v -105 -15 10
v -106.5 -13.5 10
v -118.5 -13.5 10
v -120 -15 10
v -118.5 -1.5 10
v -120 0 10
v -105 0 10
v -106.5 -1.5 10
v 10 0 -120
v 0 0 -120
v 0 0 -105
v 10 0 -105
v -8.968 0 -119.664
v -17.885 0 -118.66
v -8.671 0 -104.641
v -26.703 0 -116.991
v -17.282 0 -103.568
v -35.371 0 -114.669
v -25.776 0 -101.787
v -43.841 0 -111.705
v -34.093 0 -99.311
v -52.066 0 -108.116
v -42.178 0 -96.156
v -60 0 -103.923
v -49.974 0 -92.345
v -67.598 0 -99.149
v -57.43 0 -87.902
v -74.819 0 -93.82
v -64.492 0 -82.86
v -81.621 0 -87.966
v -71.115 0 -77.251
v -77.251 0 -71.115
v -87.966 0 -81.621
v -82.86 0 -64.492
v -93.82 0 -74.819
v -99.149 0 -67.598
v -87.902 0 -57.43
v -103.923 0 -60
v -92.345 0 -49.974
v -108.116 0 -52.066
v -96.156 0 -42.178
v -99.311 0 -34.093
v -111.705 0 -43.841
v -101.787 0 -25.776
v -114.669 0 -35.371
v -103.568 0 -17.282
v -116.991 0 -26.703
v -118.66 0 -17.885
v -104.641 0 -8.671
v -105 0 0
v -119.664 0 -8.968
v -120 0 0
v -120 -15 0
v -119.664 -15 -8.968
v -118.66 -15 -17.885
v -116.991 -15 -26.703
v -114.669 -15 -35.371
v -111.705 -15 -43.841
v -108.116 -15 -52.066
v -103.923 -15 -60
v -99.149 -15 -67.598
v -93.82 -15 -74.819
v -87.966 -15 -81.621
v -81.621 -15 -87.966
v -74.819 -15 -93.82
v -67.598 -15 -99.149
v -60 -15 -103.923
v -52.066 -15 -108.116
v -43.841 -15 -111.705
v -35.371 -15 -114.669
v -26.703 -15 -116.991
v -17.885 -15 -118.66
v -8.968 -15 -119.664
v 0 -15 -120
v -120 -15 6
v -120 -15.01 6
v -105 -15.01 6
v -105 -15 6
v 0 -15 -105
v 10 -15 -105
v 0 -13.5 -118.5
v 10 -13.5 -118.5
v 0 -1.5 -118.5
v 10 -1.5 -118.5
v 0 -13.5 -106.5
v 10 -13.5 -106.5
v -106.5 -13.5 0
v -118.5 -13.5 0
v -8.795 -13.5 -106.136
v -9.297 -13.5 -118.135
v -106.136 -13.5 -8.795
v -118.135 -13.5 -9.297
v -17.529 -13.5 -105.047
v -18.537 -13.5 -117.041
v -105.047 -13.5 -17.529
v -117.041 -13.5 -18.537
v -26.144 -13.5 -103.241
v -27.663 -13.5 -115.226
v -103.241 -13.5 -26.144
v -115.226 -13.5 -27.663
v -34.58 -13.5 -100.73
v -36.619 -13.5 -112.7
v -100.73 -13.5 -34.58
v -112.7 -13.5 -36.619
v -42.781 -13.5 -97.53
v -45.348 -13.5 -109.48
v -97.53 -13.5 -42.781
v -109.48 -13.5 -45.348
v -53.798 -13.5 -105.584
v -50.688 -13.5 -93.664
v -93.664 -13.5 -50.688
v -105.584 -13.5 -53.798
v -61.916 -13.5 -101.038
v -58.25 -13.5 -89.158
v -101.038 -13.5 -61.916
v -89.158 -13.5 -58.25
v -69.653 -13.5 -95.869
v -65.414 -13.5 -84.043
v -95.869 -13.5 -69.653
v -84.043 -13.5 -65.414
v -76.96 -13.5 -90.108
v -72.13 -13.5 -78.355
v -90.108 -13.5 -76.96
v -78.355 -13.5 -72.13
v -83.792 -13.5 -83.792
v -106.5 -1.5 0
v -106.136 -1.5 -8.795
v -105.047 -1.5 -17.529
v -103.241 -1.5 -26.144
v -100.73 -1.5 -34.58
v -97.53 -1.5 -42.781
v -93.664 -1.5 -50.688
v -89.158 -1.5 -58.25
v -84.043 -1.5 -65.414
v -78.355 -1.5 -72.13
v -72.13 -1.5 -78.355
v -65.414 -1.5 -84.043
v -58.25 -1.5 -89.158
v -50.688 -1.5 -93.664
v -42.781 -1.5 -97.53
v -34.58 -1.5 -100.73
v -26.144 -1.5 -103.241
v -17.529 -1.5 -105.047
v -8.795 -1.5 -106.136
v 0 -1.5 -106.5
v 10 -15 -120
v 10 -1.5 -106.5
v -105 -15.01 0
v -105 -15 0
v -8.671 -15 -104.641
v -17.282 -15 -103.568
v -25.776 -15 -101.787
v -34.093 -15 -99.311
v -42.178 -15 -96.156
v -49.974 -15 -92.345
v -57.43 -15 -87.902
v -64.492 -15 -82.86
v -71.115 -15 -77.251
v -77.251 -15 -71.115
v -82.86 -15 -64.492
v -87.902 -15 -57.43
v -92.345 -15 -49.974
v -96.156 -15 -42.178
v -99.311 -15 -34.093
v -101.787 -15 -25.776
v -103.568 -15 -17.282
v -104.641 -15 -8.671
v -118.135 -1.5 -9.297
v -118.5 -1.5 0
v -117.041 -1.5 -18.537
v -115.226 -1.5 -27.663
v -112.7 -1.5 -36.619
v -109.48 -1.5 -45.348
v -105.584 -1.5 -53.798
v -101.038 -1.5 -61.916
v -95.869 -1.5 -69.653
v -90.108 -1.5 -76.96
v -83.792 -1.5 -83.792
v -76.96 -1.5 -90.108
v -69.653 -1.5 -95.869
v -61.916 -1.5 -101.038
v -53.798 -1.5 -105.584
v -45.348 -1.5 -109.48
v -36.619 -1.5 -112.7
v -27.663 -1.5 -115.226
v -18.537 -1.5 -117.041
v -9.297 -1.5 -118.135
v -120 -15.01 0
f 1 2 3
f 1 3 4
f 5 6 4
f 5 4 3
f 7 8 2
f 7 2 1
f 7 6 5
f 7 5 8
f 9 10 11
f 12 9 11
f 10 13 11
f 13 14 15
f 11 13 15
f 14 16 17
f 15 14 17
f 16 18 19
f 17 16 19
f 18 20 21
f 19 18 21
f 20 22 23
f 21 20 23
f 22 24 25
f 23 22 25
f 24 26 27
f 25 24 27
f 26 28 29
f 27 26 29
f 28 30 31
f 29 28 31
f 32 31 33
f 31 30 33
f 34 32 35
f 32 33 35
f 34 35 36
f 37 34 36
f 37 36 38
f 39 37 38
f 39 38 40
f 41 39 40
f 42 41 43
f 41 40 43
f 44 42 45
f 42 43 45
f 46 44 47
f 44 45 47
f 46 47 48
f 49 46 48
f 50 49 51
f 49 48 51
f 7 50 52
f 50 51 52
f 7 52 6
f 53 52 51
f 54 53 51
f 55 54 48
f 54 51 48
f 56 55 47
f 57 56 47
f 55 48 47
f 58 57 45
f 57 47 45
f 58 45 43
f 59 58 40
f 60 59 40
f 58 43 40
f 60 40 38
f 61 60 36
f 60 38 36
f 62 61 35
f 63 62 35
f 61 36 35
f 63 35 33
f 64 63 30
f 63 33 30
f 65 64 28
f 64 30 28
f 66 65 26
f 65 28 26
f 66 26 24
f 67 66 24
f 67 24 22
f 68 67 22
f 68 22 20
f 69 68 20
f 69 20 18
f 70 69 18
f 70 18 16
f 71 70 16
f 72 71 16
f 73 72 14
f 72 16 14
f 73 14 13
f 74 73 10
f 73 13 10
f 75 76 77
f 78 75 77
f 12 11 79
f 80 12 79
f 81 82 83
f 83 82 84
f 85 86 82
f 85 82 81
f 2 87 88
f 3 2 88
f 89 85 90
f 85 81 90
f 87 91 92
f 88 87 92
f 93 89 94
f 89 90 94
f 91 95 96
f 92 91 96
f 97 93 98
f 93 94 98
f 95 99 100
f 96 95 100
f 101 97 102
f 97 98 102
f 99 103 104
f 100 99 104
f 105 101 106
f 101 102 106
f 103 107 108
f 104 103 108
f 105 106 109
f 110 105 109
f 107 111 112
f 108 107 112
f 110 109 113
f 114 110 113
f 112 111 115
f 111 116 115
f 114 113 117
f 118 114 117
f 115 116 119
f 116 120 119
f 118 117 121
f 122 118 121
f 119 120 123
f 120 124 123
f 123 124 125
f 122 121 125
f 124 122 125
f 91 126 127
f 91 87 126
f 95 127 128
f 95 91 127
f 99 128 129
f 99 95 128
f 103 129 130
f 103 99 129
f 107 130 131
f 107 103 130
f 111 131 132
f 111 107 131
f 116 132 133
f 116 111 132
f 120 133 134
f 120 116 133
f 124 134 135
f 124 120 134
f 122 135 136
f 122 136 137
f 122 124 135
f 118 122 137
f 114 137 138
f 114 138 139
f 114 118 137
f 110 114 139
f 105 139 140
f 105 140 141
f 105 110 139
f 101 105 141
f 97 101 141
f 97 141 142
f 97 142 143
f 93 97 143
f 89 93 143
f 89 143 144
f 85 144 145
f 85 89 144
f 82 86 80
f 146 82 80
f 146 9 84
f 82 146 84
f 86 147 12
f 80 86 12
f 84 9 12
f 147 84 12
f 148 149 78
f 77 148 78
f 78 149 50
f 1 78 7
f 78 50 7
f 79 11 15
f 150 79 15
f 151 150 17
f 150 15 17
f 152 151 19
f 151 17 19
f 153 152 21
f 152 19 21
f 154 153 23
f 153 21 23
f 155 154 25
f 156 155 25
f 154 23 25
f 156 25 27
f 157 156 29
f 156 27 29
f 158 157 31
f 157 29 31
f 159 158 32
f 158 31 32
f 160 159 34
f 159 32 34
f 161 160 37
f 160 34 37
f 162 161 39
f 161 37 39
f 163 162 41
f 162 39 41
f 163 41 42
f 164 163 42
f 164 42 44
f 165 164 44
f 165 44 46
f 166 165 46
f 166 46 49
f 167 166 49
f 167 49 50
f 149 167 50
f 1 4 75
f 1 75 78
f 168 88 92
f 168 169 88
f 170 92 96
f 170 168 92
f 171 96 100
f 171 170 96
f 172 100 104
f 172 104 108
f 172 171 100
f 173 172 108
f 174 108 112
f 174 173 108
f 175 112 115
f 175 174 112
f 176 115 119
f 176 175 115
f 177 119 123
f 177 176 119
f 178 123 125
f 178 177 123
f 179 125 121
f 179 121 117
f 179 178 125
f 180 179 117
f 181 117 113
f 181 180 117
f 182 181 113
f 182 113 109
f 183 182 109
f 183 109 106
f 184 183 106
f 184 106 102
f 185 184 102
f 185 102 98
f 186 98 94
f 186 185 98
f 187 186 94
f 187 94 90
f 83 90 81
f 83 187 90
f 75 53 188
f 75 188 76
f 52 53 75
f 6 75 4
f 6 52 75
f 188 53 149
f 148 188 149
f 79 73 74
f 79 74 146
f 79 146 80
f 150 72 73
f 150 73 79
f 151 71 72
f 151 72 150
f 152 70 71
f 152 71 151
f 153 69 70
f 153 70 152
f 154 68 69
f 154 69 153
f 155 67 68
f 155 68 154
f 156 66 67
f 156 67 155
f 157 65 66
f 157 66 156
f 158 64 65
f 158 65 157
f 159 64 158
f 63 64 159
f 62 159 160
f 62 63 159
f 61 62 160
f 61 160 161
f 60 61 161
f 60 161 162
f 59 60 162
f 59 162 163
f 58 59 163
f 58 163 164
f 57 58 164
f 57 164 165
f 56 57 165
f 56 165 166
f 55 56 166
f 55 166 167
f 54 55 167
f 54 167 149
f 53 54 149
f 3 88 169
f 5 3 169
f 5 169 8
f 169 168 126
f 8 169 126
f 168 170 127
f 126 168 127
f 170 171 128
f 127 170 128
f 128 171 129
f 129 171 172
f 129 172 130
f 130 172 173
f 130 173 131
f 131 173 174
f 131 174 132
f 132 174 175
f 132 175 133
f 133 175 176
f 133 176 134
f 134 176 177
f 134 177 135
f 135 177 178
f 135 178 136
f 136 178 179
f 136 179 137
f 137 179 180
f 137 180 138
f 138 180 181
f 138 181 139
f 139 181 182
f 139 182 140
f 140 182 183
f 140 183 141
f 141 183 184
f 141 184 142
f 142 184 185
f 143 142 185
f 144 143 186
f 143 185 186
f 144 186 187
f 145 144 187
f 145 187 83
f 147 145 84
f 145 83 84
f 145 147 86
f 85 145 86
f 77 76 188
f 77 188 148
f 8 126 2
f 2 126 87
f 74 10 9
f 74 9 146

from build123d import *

# Parameters (mm, degrees)
F1_DEPTH = 15
F2_DEPTH = 10
F3_DEPTH = 10
F4_W     = 15
F4_H     = 10
F5_DEPTH = 0.01
F6_W     = 15
F6_H     = 4
F7_DEPTH = 0.01
F8_W     = 12
F8_H     = 12


with BuildPart() as f1:
    # F0 (on Front) → F1 (new body)
    with BuildSketch(Plane.XZ):
        with BuildLine():
            Line((-105, 0), (-120, 0))
            ThreePointArc((-120, 0), (-84.8528137424, -84.8528137424), (0, -120))
            Line((0, -120), (0, -105))
            ThreePointArc((0, -105), (-74.2462120246, -74.2462120246), (-105, 0))
        make_face()
    extrude(amount=F1_DEPTH)

    # F2 (add): a face of the model
    f2_faces = [f1.faces().sort_by_distance(p)[0] for p in [
        (-112.5, -7.5, 0),
    ]]
    extrude(f2_faces, amount=F2_DEPTH)

    # F3 (add): a face of the model
    f3_faces = [f1.faces().sort_by_distance(p)[0] for p in [
        (0, -7.5, -112.5),
    ]]
    extrude(f3_faces, amount=F3_DEPTH)

    # F4 (on face) → F5 (join)
    with BuildSketch(Plane.XZ.offset(15)):
        with Locations((-112.5, 5)):
            Rectangle(F4_W, F4_H)
    extrude(amount=F5_DEPTH)

    # F6 (on face) → F7 (cut)
    with BuildSketch(Plane.XZ.offset(15.01)):
        with Locations((-112.5, 8)):
            Rectangle(F6_W, F6_H)
    extrude(amount=-F7_DEPTH, mode=Mode.SUBTRACT)

    # F9: sweep along a path in F9_path
    with BuildLine(Plane(origin=(-105, 0, 0), x_dir=(0, 0, -1), z_dir=(0, 1, 0))) as f9_path:
        Line((-10, 0), (0, 0))
        ThreePointArc((0, 0), (74.2462120246, -30.7537879754), (105, -105))
        Line((105, -105), (105, -115))
    # F8 (on face) → F9 (sweep, cut)
    with BuildSketch(Plane.YZ.offset(10)):
        with Locations((-7.5, -112.5)):
            Rectangle(F8_W, F8_H)
    sweep(path=f9_path.line, mode=Mode.SUBTRACT)


solid = f1.part
